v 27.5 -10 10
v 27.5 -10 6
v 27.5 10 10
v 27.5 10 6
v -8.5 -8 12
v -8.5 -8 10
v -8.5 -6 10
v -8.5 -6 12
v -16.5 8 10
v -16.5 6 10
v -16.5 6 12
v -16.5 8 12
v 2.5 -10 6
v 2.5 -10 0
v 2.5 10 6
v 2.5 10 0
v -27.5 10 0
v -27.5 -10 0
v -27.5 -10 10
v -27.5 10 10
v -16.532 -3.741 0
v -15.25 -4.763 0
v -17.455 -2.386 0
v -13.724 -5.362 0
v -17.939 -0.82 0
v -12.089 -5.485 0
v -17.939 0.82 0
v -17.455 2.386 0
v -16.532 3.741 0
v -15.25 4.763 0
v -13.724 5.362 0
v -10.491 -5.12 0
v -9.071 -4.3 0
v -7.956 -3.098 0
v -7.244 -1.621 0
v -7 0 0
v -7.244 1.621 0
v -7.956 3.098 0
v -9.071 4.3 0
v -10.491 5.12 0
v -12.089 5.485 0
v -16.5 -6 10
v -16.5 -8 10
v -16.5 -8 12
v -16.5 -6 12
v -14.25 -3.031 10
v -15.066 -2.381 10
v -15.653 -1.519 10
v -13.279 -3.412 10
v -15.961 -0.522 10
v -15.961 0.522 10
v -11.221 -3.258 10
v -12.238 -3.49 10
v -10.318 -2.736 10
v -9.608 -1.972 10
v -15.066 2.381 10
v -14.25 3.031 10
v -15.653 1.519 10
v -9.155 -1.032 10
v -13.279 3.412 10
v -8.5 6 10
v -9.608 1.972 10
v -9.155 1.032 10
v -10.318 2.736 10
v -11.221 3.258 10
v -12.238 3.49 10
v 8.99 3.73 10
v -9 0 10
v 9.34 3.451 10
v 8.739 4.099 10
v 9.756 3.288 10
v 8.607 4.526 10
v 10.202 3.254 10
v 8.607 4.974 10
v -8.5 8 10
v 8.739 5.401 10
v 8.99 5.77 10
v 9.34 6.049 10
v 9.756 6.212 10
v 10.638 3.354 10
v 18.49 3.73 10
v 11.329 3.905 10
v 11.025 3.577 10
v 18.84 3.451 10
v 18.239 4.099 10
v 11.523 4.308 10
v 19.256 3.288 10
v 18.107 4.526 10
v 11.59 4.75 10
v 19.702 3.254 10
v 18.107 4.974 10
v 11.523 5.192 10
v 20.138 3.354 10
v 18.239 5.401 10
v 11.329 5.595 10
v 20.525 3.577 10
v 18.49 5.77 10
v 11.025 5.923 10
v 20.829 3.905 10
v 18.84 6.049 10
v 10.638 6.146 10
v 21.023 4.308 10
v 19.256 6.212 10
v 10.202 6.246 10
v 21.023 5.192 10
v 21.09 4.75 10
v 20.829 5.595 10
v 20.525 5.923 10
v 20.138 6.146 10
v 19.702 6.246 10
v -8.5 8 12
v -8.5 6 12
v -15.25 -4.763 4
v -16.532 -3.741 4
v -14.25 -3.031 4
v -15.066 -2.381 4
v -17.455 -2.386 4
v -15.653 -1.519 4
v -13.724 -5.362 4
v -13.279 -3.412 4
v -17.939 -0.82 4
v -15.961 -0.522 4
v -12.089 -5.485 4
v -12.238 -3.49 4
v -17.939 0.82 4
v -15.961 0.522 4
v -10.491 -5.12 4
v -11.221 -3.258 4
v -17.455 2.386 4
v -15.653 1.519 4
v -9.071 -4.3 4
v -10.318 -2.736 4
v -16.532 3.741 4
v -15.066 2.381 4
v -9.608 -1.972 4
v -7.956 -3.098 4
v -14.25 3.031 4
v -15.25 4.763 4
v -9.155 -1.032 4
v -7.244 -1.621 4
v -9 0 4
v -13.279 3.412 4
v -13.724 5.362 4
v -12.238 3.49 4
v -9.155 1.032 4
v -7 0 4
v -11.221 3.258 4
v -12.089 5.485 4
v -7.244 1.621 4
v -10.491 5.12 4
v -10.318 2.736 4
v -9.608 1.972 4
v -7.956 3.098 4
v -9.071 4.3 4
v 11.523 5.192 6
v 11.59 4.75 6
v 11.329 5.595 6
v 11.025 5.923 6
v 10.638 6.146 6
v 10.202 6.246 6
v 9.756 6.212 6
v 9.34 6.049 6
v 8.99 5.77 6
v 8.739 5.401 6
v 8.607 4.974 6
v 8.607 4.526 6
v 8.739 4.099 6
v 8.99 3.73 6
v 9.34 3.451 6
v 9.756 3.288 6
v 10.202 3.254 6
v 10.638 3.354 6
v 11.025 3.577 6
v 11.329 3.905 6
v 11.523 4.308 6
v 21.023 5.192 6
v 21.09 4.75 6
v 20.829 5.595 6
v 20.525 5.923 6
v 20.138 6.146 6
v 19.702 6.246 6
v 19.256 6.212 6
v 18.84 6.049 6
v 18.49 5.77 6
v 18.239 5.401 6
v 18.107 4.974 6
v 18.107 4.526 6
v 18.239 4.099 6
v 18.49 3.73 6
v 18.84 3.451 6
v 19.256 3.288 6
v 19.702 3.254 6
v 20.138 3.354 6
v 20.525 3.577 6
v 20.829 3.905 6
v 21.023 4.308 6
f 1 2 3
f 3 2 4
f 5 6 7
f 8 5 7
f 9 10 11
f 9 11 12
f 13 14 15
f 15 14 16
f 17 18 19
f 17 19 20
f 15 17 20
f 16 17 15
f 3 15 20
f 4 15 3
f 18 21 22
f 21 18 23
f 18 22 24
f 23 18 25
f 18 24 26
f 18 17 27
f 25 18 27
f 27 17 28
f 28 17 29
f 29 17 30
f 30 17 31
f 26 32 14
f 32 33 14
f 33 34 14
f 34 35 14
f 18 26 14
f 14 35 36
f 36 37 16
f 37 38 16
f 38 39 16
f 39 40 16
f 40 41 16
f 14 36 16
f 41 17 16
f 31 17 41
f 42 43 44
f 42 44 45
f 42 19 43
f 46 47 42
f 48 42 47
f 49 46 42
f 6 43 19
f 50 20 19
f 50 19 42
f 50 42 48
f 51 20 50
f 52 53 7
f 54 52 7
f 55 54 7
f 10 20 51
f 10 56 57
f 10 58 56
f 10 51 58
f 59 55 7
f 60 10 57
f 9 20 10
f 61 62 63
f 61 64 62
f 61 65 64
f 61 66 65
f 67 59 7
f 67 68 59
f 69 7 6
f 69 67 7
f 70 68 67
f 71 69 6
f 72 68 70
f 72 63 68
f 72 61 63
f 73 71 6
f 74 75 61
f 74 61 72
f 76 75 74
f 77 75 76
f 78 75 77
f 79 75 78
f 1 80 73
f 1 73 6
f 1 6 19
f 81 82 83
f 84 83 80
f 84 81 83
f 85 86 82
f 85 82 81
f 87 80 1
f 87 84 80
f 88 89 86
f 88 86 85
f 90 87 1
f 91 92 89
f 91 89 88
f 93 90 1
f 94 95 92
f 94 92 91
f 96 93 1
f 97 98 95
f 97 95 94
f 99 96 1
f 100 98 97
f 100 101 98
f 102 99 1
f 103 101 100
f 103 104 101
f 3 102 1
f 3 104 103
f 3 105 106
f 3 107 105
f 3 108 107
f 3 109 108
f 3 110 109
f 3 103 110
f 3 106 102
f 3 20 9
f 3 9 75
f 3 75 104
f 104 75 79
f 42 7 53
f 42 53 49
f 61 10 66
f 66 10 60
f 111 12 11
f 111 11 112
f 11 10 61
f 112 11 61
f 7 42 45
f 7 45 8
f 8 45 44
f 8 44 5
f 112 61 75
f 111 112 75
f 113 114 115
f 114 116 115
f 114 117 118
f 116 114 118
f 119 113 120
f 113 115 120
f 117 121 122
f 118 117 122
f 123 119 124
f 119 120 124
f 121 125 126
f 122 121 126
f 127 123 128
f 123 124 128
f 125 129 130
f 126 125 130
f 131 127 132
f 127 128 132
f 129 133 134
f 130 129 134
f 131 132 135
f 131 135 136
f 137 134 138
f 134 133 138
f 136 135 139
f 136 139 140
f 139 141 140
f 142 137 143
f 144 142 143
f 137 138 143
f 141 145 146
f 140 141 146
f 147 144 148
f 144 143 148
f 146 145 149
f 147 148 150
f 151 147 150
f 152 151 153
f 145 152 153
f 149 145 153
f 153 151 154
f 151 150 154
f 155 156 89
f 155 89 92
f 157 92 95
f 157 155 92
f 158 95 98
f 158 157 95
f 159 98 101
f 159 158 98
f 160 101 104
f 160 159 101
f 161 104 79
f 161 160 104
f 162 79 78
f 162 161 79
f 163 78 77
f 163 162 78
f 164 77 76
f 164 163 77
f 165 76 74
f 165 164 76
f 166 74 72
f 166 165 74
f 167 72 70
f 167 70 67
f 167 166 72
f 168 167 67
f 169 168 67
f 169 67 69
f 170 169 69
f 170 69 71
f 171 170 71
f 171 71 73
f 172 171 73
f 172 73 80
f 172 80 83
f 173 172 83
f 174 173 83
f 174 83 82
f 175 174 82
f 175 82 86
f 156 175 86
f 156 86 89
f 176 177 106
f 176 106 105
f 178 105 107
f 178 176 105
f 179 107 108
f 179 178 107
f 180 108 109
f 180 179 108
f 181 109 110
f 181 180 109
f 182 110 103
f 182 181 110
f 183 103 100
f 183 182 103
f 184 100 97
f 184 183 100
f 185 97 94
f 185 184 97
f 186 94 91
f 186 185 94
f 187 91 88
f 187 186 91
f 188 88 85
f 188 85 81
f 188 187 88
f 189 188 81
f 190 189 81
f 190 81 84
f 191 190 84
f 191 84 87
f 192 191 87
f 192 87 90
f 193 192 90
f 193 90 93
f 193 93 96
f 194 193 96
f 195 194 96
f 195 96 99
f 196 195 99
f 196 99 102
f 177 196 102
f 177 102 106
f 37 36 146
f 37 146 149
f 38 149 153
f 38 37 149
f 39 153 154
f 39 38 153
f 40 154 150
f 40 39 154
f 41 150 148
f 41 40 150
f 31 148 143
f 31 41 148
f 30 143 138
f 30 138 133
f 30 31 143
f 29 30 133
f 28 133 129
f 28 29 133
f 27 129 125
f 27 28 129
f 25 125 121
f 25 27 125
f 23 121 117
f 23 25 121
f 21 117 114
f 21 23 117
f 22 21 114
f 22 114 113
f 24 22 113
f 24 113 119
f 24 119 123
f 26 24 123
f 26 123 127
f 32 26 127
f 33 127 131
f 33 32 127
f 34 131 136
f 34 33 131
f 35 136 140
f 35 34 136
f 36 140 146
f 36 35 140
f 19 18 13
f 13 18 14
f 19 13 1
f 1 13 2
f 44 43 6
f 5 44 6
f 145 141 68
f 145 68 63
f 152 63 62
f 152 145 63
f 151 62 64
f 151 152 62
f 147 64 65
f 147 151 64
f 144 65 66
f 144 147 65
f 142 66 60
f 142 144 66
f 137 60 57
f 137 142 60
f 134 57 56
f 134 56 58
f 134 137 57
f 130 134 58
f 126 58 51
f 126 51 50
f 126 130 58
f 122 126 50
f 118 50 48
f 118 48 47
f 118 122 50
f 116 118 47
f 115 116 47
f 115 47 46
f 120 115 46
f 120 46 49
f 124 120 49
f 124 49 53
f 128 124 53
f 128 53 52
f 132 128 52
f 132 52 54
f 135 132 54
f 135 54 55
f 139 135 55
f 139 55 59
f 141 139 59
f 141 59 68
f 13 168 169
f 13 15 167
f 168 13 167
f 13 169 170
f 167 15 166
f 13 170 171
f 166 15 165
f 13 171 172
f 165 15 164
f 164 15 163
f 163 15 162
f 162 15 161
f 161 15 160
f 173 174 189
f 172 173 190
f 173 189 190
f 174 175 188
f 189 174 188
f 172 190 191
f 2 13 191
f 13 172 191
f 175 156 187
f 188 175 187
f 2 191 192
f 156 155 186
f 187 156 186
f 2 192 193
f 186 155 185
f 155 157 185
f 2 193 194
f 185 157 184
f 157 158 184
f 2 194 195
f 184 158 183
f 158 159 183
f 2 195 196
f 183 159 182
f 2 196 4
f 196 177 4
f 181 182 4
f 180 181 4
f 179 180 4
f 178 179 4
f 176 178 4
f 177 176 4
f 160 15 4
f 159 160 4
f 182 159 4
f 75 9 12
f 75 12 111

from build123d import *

# Parameters (mm, degrees)
F0_W     = 55
F0_H     = 20
F0_R     = 3.5
F0_R_2   = 1.5
F1_DEPTH = 10
F2_W     = 8
F2_H     = 2
F3_DEPTH = 2
F4_R     = 5.5
F5_DEPTH = 4
F6_W     = 25
F6_H     = 20
F7_DEPTH = 6


with BuildPart() as f1:
    # F0 (on Top) → F1 (new body)
    with BuildSketch(Plane.XY):
        Rectangle(F0_W, F0_H)
        with Locations((-12.5, 0)):
            Circle(F0_R, mode=Mode.SUBTRACT)
        with Locations((10.09, 4.75)):
            Circle(F0_R_2, mode=Mode.SUBTRACT)
        with Locations((19.59, 4.75)):
            Circle(F0_R_2, mode=Mode.SUBTRACT)
    extrude(amount=F1_DEPTH)

    # F2 (on face) → F3 (join)
    with BuildSketch(Plane.XY.offset(10)):
        with Locations((-12.5, 7)):
            Rectangle(F2_W, F2_H)
        with Locations((-12.5, -7)):
            Rectangle(F2_W, F2_H)
    extrude(amount=F3_DEPTH)

    # F4 (on Top) → F5 (cut)
    with BuildSketch(Plane.XY):
        with Locations((-12.5, 0)):
            Circle(F4_R)
    extrude(amount=F5_DEPTH, mode=Mode.SUBTRACT)

    # F6 (on Top) → F7 (cut)
    with BuildSketch(Plane.XY):
        with Locations((15, 0)):
            Rectangle(F6_W, F6_H)
    extrude(amount=F7_DEPTH, mode=Mode.SUBTRACT)


solid = f1.part
